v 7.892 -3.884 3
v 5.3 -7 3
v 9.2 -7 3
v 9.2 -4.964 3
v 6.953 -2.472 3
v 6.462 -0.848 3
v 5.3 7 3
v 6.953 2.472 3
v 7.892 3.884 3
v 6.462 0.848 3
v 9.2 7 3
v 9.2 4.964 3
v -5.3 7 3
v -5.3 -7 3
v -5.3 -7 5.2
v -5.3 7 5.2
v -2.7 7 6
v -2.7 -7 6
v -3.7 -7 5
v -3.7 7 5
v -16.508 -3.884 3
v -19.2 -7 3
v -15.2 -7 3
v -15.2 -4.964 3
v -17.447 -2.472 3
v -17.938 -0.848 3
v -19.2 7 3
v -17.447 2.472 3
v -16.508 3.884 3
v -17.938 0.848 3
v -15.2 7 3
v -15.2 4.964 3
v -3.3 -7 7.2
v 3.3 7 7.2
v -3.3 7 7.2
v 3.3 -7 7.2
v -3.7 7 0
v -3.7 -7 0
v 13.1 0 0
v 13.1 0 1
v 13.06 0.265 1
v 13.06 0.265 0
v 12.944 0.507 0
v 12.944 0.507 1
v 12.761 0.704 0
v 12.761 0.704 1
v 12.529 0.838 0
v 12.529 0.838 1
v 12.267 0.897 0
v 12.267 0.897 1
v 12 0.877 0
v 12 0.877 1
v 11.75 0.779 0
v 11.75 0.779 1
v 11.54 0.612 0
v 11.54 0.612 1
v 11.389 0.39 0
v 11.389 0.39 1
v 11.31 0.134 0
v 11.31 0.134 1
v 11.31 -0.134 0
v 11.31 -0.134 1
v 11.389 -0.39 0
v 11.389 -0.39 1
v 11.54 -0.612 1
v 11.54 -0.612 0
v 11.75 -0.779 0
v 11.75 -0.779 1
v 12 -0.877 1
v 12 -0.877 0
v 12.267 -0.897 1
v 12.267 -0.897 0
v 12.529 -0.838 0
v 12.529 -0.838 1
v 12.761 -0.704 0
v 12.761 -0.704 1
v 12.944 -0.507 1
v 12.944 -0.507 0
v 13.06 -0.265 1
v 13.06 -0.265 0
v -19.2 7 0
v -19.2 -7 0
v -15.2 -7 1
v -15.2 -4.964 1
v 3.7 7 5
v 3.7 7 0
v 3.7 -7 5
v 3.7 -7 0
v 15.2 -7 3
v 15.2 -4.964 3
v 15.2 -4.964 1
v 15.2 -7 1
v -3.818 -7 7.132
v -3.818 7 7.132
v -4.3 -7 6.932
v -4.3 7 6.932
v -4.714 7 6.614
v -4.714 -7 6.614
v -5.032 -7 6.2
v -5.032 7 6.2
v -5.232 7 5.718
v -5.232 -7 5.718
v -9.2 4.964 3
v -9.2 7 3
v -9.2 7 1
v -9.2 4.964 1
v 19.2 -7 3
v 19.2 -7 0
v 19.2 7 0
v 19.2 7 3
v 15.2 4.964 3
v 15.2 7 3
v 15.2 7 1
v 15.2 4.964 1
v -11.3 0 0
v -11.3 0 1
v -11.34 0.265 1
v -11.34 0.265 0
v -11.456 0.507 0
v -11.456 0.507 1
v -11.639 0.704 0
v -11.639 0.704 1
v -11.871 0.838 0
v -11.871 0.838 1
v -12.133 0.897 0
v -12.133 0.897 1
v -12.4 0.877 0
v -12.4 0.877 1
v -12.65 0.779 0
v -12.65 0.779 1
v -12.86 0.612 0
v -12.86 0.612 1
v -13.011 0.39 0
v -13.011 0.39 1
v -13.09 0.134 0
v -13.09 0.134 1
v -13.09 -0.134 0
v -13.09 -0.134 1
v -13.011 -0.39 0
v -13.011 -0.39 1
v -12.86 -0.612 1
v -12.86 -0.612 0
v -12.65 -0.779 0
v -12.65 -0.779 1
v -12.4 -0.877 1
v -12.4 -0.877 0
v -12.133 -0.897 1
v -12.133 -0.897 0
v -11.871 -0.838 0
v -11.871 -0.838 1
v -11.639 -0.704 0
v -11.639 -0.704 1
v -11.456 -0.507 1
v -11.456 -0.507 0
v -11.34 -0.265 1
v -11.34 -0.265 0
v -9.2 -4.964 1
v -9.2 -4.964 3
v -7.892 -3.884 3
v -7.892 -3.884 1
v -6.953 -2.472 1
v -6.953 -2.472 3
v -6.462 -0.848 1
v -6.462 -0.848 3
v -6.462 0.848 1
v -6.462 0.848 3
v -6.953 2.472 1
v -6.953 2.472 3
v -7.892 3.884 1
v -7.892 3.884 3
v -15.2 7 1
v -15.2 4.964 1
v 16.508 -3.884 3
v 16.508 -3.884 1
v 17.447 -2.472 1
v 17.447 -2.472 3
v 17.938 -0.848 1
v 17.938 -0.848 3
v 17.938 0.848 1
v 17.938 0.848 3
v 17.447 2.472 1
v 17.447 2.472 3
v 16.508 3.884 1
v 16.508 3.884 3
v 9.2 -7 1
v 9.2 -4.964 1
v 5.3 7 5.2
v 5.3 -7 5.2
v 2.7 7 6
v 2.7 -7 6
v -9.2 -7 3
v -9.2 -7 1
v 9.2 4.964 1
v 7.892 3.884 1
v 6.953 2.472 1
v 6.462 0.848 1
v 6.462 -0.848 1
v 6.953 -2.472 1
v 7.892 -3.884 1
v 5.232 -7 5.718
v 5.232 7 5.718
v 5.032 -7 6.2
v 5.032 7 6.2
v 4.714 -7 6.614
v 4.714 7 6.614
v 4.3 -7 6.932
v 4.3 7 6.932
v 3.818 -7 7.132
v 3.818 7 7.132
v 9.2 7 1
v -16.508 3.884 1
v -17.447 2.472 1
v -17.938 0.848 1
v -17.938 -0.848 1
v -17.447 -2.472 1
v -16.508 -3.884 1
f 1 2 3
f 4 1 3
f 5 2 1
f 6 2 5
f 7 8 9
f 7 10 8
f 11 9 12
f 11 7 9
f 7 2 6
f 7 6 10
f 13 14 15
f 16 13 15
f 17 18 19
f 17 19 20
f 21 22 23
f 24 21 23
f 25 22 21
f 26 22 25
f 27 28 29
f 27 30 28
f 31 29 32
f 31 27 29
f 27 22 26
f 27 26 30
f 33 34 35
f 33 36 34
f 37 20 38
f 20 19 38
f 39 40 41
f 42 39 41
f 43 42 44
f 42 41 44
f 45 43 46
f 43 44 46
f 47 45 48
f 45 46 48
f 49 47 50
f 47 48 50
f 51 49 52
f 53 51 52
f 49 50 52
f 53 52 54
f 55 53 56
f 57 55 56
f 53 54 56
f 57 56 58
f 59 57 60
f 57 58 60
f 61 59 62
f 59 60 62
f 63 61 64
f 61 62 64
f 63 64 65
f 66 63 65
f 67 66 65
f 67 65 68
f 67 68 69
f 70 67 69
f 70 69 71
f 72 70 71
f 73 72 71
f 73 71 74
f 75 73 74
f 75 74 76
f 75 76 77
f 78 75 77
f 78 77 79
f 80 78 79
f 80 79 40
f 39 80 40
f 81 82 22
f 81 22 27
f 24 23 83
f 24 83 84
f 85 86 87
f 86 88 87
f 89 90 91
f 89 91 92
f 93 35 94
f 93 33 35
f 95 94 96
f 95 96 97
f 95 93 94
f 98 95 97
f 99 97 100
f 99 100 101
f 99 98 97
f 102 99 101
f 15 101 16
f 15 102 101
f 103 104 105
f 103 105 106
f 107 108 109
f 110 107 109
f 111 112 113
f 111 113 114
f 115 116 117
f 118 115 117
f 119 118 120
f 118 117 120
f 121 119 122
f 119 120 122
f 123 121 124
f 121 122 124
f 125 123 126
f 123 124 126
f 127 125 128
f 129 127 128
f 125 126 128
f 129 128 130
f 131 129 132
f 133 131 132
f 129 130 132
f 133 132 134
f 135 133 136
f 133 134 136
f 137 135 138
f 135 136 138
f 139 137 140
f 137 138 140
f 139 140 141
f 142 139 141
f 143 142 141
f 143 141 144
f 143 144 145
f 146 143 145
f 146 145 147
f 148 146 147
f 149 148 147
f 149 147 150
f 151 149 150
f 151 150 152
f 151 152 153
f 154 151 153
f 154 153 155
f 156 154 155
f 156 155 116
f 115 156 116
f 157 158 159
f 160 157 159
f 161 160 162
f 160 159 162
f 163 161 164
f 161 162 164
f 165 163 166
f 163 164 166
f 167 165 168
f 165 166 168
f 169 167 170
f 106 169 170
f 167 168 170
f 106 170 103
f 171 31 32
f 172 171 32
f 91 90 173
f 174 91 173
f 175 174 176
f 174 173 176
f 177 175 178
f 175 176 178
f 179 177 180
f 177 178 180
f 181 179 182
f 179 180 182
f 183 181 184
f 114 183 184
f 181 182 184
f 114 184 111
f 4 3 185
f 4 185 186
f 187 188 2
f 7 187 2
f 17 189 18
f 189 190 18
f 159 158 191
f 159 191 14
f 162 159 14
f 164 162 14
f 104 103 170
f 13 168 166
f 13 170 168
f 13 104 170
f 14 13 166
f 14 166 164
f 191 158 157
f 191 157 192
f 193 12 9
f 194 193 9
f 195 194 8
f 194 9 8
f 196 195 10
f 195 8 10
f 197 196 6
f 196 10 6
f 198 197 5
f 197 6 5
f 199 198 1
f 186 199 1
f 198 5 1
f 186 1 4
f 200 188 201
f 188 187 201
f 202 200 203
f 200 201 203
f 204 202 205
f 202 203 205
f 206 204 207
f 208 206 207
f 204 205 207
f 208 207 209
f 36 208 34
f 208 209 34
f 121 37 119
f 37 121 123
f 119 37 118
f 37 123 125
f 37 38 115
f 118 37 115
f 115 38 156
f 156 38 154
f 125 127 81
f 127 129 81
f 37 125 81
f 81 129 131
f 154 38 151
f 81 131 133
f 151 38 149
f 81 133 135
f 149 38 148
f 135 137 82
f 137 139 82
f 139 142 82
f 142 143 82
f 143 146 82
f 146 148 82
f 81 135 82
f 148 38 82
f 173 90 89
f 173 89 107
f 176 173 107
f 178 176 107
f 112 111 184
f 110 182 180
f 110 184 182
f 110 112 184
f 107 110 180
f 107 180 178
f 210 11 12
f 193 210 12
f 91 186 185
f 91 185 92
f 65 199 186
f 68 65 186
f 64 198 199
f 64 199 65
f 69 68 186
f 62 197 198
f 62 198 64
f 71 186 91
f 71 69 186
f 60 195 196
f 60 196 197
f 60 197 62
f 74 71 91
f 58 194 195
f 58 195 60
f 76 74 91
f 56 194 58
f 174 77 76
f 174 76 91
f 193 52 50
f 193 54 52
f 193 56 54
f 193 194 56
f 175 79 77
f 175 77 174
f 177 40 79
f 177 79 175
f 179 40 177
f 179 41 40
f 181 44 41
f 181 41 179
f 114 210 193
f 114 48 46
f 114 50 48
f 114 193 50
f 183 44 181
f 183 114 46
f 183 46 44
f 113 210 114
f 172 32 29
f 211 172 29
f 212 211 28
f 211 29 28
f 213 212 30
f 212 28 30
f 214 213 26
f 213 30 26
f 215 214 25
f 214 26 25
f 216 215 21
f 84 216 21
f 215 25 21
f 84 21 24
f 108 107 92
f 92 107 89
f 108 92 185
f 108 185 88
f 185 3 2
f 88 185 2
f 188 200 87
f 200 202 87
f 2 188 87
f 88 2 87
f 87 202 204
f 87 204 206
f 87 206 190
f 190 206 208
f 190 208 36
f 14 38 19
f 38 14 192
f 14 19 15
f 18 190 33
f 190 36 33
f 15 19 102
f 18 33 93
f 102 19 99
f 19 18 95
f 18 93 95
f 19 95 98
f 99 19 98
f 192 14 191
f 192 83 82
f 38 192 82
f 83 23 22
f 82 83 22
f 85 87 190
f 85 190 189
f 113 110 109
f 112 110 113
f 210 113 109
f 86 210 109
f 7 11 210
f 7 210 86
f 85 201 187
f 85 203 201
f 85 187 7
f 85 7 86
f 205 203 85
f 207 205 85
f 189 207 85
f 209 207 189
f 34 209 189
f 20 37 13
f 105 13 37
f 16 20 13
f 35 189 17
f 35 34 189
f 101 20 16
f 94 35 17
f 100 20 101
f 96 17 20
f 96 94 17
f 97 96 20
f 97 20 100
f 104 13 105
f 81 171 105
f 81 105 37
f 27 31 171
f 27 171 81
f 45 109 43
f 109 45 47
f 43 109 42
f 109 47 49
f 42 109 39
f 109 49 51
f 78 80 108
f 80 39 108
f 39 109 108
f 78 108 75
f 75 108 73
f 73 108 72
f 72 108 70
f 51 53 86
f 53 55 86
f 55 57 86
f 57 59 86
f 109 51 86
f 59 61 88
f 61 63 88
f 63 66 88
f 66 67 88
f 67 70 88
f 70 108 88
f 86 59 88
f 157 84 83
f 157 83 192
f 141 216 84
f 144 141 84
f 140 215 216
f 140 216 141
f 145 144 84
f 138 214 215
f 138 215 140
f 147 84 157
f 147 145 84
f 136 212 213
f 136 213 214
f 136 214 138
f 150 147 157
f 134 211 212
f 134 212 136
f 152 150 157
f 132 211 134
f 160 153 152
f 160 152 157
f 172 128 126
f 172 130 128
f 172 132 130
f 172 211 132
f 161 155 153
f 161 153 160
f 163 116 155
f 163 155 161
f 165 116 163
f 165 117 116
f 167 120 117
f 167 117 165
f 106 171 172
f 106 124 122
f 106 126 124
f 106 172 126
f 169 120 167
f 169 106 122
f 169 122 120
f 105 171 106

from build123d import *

# Parameters (mm, degrees)
PAD_DEPTH       = 7
SKETCH006_W     = 14
SKETCH006_H     = 14
PAD002_DEPTH    = 3
POCKET004_DEPTH = 2
SKETCH008_R     = 0.9
POCKET005_DEPTH = 1.001
FILLET001_R     = 2
CHAMFER_SIZE    = 1


with BuildPart() as clamp_unit001:
    # Sketch → Pad (new body, symmetric)
    with BuildSketch(Plane.XZ):
        Polygon((-3.7, 7.2), (5.3, 7.2), (5.3, 0), (3.7, 0), (3.7, 6), (-3.7, 6), (-3.7, 0), (-5.3, 0), (-5.3, 7.2), align=None)
    extrude(amount=PAD_DEPTH, both=True)


with BuildPart() as pushpin_unit002:
    # Sketch006 → Pad002 (new body)
    with BuildSketch(Plane.XY):
        Rectangle(SKETCH006_W, SKETCH006_H)
    extrude(amount=PAD002_DEPTH)

    # Sketch007 (on Face6 of Pad002) → Pocket004 (cut)
    with BuildSketch(Plane.XY.offset(3)):
        with BuildLine():
            Line((-3, 7), (-3, 4.963869))
            ThreePointArc((-3, 4.963869), (-5.8, 0), (-3, -4.963869))
            Line((-3, -7), (-3, -4.963869))
            Line((3, -7), (-3, -7))
            Line((3, -4.963869), (3, -7))
            ThreePointArc((3, -4.963869), (5.8, 0), (3, 4.963869))
            Line((3, 7), (3, 4.963869))
            Line((-3, 7), (3, 7))
        make_face()
    extrude(amount=-POCKET004_DEPTH, mode=Mode.SUBTRACT)

    # Sketch008 (on Face6 of Pocket004) → Pocket005 (cut, through all)
    with BuildSketch(Plane.XY.offset(1)):
        Circle(SKETCH008_R)
    extrude(amount=-POCKET005_DEPTH, mode=Mode.SUBTRACT)


with BuildPart() as pushpin_unit002_1:
    # Clone placement: moved
    add(pushpin_unit002.part.moved(Location((-11.2, 0, 0))))


with BuildPart() as pushpin_unit002_2:
    # Clone002 placement: moved
    add(pushpin_unit002_1.part.moved(Location((-1, 0, 0))))


with BuildPart() as pushpin_unit003:
    # Clone004 base: copy of pushpin-unit002
    add(pushpin_unit002_2.part)


with BuildPart() as pushpin_unit003_1:
    # Clone004 placement: moved
    add(pushpin_unit003.part.moved(Location((24.4, 0, 0))))


with BuildPart() as sujeta_cables_grande:
    # Fusion001 base: copy of pushpin-unit002
    add(pushpin_unit002_2.part)

    # Fusion001: union clamp-unit001, pushpin-unit003
    add(clamp_unit001.part)
    add(pushpin_unit003_1.part)

    # Fillet001
    fillet001_edges = [sujeta_cables_grande.edges().sort_by_distance(p)[0] for p in [
        (5.3, 0, 7.2),
        (-5.3, 0, 7.2),
    ]]
    fillet(fillet001_edges, radius=FILLET001_R)

    # Chamfer
    chamfer_edges = [sujeta_cables_grande.edges().sort_by_distance(p)[0] for p in [
        (-3.7, 0, 6),
        (3.7, 0, 6),
    ]]
    chamfer(chamfer_edges, length=CHAMFER_SIZE)


solid = sujeta_cables_grande.part
